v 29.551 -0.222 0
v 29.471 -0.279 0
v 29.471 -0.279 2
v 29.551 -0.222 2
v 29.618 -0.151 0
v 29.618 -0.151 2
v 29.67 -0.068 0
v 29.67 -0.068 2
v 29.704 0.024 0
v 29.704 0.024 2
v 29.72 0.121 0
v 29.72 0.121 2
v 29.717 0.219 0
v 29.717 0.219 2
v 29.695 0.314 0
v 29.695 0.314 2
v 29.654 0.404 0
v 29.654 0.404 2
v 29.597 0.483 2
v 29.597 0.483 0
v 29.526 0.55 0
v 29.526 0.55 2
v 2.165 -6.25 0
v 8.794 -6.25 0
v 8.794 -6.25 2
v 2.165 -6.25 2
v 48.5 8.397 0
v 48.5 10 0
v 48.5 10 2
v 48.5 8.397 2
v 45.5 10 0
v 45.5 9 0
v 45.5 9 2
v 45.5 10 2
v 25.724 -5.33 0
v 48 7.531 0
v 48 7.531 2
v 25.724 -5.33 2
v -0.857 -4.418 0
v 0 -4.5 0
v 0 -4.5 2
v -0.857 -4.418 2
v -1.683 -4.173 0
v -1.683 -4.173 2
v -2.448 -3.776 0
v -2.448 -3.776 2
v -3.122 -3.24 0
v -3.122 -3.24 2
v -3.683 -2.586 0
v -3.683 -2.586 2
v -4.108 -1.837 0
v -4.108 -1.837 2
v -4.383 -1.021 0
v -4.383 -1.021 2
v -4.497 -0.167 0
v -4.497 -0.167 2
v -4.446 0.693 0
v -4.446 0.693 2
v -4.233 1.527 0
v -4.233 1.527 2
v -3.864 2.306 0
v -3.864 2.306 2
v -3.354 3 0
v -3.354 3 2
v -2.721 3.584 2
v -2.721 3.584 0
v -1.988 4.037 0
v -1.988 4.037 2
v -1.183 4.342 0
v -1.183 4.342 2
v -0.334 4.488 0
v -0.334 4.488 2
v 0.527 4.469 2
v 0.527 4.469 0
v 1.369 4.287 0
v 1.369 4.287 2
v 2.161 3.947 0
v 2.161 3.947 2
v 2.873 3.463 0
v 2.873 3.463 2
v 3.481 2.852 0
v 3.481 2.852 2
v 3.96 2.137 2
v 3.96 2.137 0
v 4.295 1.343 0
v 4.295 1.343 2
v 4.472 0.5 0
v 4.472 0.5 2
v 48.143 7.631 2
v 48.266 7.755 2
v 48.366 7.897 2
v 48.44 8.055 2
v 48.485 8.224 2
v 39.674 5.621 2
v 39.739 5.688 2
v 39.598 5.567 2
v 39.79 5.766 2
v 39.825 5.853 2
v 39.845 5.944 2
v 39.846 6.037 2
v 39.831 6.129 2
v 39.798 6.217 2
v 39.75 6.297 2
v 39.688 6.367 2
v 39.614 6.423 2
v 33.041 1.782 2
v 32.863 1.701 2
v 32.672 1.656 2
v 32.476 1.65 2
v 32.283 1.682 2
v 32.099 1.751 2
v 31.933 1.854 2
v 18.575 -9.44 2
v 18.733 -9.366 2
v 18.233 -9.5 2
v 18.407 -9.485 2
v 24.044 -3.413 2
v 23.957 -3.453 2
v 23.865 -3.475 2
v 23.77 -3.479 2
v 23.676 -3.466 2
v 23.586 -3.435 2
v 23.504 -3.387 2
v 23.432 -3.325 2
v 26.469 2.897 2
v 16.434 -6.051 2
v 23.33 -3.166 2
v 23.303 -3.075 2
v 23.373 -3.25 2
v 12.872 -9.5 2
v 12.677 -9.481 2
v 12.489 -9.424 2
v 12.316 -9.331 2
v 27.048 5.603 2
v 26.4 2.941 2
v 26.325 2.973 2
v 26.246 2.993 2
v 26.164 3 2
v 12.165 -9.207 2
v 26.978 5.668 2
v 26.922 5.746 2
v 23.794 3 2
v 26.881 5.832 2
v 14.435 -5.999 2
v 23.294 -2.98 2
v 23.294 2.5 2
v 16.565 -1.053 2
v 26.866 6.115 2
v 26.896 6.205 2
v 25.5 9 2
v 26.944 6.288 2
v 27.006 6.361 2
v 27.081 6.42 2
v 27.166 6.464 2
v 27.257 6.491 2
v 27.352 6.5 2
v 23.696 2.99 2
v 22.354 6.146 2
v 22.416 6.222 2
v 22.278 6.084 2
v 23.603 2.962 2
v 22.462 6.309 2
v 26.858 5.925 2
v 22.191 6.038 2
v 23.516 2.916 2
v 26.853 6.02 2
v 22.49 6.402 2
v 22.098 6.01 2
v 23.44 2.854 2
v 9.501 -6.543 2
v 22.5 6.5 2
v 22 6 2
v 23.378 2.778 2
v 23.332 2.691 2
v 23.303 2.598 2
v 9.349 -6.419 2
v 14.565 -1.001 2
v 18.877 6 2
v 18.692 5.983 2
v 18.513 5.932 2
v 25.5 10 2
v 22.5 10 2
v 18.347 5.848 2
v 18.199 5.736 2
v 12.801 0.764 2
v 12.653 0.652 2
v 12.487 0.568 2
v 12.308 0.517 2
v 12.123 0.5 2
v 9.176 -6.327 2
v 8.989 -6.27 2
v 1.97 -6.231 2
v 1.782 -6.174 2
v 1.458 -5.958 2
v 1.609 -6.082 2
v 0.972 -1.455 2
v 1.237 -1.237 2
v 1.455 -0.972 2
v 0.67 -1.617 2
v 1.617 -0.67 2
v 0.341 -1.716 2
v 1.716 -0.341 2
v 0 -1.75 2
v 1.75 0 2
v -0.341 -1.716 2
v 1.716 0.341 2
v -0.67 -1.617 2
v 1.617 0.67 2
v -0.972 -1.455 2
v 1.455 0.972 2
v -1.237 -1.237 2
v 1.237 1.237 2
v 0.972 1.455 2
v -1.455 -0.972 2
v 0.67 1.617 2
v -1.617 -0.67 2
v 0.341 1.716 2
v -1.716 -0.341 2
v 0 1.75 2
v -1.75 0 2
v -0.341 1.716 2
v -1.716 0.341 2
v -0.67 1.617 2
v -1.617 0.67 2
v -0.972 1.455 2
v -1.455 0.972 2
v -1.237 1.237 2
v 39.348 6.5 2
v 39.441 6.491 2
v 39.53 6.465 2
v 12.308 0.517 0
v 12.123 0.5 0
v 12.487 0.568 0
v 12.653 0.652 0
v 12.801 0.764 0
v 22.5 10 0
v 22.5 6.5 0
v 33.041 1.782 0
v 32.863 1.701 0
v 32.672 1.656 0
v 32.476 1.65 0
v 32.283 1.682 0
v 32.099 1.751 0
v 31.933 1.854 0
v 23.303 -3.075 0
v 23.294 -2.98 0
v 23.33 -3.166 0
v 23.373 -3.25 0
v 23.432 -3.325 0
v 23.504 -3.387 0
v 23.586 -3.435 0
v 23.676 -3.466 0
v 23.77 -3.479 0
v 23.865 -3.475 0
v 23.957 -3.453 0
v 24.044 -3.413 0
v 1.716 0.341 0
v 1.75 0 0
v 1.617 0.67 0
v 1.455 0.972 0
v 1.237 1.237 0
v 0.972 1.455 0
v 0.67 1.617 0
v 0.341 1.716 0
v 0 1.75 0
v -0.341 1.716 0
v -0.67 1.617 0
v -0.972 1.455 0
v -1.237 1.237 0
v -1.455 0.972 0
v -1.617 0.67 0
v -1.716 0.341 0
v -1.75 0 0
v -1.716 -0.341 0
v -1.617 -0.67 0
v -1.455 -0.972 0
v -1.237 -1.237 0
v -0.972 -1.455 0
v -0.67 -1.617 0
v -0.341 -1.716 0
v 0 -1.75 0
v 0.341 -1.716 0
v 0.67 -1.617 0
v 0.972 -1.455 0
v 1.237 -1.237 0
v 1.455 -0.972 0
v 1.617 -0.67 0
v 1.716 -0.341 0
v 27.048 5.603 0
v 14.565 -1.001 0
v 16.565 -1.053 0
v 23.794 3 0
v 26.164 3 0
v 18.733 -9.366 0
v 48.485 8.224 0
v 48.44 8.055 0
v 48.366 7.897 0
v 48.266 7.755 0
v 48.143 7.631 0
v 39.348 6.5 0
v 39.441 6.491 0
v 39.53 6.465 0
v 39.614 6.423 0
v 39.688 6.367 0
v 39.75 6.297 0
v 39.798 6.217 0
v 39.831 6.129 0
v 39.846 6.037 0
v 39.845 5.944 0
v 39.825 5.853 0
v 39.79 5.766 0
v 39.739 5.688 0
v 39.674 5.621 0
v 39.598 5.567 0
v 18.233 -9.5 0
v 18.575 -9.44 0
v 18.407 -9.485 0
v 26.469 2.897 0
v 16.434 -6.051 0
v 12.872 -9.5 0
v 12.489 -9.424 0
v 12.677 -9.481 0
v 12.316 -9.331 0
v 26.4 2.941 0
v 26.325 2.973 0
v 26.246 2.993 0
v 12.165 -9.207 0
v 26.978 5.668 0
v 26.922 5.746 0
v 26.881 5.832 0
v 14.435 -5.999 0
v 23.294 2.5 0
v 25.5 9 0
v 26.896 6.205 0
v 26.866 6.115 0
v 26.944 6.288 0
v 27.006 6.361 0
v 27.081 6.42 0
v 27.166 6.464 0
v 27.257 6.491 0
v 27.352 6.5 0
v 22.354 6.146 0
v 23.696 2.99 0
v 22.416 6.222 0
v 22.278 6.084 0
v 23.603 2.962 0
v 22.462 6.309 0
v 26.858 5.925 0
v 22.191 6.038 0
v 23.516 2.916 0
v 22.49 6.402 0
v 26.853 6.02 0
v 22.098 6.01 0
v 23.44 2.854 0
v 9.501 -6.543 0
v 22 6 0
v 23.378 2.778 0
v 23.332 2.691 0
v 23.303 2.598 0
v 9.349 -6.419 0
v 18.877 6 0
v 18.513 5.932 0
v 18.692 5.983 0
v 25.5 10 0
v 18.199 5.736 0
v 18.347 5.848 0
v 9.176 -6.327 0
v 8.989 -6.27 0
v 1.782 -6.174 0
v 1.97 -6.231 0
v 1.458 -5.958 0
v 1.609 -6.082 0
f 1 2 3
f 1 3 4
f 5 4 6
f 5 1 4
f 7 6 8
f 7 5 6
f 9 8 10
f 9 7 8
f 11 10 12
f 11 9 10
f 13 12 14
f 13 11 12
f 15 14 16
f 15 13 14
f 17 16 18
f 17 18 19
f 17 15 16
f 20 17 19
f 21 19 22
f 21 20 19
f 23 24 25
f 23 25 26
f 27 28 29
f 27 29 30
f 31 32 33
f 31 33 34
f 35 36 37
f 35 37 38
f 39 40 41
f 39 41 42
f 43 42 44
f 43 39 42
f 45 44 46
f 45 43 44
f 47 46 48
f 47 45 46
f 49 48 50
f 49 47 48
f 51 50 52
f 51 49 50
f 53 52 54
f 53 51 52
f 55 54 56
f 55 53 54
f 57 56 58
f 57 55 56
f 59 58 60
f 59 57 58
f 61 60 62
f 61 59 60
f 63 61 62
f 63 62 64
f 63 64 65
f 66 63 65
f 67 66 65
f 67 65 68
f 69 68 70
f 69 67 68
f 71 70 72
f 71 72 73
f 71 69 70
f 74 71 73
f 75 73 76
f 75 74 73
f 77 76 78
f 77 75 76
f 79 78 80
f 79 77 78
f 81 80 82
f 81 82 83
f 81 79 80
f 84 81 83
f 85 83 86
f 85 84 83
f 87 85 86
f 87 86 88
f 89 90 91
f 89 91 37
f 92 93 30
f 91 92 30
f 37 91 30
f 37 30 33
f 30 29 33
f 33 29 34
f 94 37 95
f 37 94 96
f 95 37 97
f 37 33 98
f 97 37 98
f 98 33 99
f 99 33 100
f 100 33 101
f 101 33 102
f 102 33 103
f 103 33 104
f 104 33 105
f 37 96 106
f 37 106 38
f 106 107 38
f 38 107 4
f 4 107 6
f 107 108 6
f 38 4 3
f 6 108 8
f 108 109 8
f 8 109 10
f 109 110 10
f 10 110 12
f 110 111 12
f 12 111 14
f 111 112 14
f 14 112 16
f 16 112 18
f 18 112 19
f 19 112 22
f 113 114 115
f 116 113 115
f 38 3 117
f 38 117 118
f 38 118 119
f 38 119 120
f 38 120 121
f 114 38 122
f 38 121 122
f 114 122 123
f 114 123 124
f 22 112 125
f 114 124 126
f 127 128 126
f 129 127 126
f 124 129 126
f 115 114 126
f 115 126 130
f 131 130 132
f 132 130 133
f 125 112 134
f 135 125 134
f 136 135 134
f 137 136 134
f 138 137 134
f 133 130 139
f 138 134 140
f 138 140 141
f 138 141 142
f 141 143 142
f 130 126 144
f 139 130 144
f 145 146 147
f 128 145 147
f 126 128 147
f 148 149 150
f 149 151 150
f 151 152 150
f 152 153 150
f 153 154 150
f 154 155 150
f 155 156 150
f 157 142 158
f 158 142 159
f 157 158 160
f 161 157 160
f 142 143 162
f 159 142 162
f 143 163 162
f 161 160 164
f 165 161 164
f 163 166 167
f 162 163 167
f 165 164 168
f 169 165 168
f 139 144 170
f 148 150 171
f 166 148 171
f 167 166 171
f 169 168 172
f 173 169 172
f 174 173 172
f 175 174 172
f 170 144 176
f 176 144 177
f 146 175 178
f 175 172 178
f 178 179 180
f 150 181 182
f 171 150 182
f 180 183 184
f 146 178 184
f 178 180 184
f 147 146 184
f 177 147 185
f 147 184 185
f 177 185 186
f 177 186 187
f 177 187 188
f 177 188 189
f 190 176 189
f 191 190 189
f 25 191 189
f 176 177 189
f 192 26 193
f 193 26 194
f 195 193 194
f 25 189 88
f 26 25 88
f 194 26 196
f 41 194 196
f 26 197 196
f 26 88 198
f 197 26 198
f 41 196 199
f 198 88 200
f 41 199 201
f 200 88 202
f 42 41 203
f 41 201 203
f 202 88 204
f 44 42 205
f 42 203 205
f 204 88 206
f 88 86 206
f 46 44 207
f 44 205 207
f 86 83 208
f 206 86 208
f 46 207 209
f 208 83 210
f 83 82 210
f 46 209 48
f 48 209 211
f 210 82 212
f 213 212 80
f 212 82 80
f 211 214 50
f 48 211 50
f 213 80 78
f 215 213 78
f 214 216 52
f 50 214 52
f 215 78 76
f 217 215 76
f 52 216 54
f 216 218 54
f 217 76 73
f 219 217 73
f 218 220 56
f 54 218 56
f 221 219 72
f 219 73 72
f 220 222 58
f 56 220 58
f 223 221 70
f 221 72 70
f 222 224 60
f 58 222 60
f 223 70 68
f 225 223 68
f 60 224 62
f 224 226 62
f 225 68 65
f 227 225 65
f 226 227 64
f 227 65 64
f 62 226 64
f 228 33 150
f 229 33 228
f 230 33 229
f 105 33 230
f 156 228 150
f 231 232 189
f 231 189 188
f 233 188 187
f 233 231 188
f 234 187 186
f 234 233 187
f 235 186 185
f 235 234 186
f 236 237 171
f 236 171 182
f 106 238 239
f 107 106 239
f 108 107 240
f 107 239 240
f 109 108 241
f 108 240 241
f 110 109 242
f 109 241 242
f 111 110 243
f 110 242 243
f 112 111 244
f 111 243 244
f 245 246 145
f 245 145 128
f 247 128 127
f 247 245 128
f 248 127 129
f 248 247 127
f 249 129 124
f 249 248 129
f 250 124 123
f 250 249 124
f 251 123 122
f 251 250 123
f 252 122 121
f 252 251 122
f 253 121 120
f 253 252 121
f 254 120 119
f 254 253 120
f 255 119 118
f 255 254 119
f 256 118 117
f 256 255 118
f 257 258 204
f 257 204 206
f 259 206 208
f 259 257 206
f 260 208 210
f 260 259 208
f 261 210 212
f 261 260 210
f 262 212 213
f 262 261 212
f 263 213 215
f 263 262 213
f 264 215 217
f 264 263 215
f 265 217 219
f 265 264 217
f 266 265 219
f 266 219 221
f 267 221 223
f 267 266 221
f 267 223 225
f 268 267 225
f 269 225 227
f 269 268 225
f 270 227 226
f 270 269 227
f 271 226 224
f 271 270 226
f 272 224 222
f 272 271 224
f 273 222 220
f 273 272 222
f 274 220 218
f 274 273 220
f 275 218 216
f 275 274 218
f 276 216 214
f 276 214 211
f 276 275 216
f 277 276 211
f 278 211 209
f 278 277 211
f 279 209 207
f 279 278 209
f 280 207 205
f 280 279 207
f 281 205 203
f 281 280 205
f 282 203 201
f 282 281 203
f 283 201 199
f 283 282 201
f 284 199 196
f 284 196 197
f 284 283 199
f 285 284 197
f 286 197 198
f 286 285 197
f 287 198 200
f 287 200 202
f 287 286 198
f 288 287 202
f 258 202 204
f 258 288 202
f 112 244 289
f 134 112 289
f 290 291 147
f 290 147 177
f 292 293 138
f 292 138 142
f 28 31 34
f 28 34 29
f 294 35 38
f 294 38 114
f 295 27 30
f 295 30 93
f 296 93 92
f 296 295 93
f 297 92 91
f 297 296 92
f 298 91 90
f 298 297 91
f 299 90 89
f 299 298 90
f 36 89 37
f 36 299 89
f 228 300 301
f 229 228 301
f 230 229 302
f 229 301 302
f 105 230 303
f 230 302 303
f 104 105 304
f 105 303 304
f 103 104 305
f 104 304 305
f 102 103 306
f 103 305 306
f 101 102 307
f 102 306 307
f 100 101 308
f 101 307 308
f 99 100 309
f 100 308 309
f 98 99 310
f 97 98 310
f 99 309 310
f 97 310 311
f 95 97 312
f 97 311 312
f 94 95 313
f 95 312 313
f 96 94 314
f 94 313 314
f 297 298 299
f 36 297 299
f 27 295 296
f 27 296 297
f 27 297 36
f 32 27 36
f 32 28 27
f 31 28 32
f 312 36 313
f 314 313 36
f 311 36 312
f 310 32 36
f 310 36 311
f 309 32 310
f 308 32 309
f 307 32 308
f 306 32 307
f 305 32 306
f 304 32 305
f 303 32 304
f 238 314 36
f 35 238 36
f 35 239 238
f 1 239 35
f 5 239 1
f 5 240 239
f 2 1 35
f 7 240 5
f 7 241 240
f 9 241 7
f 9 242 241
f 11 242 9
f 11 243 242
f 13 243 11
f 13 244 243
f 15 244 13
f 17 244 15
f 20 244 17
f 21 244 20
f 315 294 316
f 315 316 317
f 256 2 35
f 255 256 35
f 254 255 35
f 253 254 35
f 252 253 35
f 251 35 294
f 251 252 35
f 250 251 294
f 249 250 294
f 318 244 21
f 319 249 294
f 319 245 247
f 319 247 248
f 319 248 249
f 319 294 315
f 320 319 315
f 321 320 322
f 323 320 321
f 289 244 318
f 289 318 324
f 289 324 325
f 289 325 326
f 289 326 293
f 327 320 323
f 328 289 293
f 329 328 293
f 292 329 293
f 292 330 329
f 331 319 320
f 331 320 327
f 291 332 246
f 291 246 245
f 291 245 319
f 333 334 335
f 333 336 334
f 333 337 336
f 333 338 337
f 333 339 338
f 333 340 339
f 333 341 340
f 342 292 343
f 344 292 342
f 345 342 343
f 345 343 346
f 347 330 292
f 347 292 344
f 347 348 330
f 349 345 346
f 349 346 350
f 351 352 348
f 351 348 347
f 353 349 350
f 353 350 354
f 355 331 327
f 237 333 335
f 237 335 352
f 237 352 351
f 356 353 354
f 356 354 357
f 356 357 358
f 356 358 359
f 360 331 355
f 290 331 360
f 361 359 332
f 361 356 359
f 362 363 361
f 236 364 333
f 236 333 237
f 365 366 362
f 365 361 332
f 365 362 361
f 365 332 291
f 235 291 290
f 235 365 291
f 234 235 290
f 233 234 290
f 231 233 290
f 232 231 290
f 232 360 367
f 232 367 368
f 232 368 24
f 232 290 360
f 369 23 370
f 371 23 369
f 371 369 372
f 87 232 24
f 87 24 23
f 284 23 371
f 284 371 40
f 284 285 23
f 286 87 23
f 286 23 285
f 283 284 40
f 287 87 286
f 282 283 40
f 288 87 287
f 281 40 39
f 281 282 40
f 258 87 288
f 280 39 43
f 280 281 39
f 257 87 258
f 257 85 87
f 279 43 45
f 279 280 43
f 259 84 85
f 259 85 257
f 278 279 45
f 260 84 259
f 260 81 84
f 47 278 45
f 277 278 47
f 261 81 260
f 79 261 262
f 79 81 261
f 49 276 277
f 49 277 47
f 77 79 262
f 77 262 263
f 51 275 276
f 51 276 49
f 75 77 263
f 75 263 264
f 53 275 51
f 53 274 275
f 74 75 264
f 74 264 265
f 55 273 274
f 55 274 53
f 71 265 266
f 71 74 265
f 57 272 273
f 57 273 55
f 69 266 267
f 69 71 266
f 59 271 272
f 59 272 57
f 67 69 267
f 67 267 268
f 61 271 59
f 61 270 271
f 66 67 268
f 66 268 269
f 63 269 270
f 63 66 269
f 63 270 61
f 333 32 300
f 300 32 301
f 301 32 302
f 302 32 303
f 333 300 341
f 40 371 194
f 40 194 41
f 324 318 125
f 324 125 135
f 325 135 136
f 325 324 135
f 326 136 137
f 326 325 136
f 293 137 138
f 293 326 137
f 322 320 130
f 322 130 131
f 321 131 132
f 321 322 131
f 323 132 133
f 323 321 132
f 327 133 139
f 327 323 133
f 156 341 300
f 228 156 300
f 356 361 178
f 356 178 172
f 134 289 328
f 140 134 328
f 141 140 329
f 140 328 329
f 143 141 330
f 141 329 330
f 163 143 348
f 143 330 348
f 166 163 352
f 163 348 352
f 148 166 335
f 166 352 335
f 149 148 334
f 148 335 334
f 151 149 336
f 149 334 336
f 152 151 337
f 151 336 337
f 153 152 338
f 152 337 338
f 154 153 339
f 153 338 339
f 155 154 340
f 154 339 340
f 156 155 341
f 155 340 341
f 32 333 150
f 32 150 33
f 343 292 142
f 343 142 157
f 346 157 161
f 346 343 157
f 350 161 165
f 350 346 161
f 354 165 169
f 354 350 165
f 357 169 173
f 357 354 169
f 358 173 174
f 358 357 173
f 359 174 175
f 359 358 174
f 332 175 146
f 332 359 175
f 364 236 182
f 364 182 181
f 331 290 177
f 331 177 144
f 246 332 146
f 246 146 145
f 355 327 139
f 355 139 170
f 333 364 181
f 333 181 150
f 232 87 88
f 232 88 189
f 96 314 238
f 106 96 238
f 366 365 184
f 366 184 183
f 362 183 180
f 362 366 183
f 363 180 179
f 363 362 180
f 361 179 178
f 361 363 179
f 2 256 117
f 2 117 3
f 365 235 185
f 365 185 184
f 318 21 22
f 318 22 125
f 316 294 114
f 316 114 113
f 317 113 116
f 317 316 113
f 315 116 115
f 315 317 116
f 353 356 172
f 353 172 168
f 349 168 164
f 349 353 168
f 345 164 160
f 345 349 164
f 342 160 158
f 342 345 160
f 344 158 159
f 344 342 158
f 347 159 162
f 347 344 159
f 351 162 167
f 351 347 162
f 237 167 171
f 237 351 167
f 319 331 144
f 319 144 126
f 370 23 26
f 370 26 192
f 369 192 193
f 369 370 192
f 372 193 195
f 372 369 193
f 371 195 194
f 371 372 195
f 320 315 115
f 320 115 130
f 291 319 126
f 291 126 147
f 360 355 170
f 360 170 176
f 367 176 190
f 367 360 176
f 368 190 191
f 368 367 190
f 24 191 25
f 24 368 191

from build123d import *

# Parameters (mm, degrees)
SKETCH1_R           = 1.75
BOSS_EXTRUDE1_DEPTH = 2


with BuildPart() as part:
    # Sketch1 → Boss-Extrude1 (new body)
    with BuildSketch(Plane.XY):
        with BuildLine():
            Line((4.472135955, 0.5), (12.123157342, 0.5))
            ThreePointArc((12.123157342, 0.5), (12.486721612, 0.568430882), (12.800527834, 0.764357957))
            Line((12.800527834, 0.764357957), (18.199472166, 5.735642043))
            ThreePointArc((18.199472166, 5.735642043), (18.513278388, 5.931569118), (18.876842658, 6))
            Line((18.876842658, 6), (22, 6))
            ThreePointArc((22, 6), (22.353553391, 6.146446609), (22.5, 6.5))
            Line((22.5, 6.5), (22.5, 10))
            Line((22.5, 10), (25.5, 10))
            Line((25.5, 10), (25.5, 9))
            Line((25.5, 9), (45.5, 9))
            Line((45.5, 9), (45.5, 10))
            Line((45.5, 10), (48.5, 10))
            Line((48.5, 10), (48.5, 8.397324532))
            ThreePointArc((48.5, 8.397324532), (48.366025404, 7.897324532), (48, 7.531299129))
            Line((48, 7.531299129), (25.723862599, -5.329834796))
            Line((25.723862599, -5.329834796), (18.732975398, -9.366025404))
            ThreePointArc((18.732975398, -9.366025404), (18.491794443, -9.465925826), (18.232975398, -9.5))
            Line((18.232975398, -9.5), (12.871682623, -9.5))
            ThreePointArc((12.871682623, -9.5), (12.48899919, -9.423879533), (12.164575841, -9.207106781))
            Line((12.164575841, -9.207106781), (9.500810677, -6.543341617))
            ThreePointArc((9.500810677, -6.543341617), (9.176387328, -6.326568865), (8.793703896, -6.250448398))
            Line((8.793703896, -6.250448398), (2.16466196, -6.250448398))
            ThreePointArc((2.16466196, -6.250448398), (1.781978528, -6.17432793), (1.457555179, -5.957555179))
            Line((1.457555179, -5.957555179), (0, -4.5))
            ThreePointArc((0, -4.5), (-3.354101966, 3), (4.472135955, 0.5))
        make_face()
        Circle(SKETCH1_R, mode=Mode.SUBTRACT)
        with BuildLine():
            Line((27.801871392, 6.5), (39.347712108, 6.5))
            ThreePointArc((39.347712108, 6.5), (39.830675021, 6.129409523), (39.597712108, 5.566987298))
            Line((39.597712108, 5.566987298), (33.04143505, 1.781718974))
            ThreePointArc((33.04143505, 1.781718974), (32.475981159, 1.649888783), (31.932592907, 1.854452979))
            Line((31.932592907, 1.854452979), (27.047958678, 5.6033543))
            ThreePointArc((27.047958678, 5.6033543), (26.878922862, 6.160743818), (27.35237975, 6.5))
            Line((27.35237975, 6.5), (27.801871392, 6.5))
        make_face(mode=Mode.SUBTRACT)
        with BuildLine():
            Line((29.525805665, 0.550207783), (26.468512346, 2.8966457))
            ThreePointArc((26.468512346, 2.8966457), (26.324835093, 2.973456888), (26.164091274, 3))
            Line((26.164091274, 3), (23.793857984, 3))
            ThreePointArc((23.793857984, 3), (23.440304593, 2.853553391), (23.293857984, 2.5))
            Line((23.293857984, 2.5), (23.293857984, -2.980021865))
            ThreePointArc((23.293857984, -2.980021865), (23.543857984, -3.413034567), (24.043857984, -3.413034567))
            Line((24.043857984, -3.413034567), (29.471384593, -0.279450618))
            ThreePointArc((29.471384593, -0.279450618), (29.72031239, 0.120835138), (29.525805665, 0.550207783))
        make_face(mode=Mode.SUBTRACT)
        Polygon((14.565442371, -1.000856688), (14.434557629, -5.999143312), (16.433872279, -6.051497209), (16.564757021, -1.053210584), align=None, mode=Mode.SUBTRACT)
    extrude(amount=BOSS_EXTRUDE1_DEPTH)


solid = part.part
